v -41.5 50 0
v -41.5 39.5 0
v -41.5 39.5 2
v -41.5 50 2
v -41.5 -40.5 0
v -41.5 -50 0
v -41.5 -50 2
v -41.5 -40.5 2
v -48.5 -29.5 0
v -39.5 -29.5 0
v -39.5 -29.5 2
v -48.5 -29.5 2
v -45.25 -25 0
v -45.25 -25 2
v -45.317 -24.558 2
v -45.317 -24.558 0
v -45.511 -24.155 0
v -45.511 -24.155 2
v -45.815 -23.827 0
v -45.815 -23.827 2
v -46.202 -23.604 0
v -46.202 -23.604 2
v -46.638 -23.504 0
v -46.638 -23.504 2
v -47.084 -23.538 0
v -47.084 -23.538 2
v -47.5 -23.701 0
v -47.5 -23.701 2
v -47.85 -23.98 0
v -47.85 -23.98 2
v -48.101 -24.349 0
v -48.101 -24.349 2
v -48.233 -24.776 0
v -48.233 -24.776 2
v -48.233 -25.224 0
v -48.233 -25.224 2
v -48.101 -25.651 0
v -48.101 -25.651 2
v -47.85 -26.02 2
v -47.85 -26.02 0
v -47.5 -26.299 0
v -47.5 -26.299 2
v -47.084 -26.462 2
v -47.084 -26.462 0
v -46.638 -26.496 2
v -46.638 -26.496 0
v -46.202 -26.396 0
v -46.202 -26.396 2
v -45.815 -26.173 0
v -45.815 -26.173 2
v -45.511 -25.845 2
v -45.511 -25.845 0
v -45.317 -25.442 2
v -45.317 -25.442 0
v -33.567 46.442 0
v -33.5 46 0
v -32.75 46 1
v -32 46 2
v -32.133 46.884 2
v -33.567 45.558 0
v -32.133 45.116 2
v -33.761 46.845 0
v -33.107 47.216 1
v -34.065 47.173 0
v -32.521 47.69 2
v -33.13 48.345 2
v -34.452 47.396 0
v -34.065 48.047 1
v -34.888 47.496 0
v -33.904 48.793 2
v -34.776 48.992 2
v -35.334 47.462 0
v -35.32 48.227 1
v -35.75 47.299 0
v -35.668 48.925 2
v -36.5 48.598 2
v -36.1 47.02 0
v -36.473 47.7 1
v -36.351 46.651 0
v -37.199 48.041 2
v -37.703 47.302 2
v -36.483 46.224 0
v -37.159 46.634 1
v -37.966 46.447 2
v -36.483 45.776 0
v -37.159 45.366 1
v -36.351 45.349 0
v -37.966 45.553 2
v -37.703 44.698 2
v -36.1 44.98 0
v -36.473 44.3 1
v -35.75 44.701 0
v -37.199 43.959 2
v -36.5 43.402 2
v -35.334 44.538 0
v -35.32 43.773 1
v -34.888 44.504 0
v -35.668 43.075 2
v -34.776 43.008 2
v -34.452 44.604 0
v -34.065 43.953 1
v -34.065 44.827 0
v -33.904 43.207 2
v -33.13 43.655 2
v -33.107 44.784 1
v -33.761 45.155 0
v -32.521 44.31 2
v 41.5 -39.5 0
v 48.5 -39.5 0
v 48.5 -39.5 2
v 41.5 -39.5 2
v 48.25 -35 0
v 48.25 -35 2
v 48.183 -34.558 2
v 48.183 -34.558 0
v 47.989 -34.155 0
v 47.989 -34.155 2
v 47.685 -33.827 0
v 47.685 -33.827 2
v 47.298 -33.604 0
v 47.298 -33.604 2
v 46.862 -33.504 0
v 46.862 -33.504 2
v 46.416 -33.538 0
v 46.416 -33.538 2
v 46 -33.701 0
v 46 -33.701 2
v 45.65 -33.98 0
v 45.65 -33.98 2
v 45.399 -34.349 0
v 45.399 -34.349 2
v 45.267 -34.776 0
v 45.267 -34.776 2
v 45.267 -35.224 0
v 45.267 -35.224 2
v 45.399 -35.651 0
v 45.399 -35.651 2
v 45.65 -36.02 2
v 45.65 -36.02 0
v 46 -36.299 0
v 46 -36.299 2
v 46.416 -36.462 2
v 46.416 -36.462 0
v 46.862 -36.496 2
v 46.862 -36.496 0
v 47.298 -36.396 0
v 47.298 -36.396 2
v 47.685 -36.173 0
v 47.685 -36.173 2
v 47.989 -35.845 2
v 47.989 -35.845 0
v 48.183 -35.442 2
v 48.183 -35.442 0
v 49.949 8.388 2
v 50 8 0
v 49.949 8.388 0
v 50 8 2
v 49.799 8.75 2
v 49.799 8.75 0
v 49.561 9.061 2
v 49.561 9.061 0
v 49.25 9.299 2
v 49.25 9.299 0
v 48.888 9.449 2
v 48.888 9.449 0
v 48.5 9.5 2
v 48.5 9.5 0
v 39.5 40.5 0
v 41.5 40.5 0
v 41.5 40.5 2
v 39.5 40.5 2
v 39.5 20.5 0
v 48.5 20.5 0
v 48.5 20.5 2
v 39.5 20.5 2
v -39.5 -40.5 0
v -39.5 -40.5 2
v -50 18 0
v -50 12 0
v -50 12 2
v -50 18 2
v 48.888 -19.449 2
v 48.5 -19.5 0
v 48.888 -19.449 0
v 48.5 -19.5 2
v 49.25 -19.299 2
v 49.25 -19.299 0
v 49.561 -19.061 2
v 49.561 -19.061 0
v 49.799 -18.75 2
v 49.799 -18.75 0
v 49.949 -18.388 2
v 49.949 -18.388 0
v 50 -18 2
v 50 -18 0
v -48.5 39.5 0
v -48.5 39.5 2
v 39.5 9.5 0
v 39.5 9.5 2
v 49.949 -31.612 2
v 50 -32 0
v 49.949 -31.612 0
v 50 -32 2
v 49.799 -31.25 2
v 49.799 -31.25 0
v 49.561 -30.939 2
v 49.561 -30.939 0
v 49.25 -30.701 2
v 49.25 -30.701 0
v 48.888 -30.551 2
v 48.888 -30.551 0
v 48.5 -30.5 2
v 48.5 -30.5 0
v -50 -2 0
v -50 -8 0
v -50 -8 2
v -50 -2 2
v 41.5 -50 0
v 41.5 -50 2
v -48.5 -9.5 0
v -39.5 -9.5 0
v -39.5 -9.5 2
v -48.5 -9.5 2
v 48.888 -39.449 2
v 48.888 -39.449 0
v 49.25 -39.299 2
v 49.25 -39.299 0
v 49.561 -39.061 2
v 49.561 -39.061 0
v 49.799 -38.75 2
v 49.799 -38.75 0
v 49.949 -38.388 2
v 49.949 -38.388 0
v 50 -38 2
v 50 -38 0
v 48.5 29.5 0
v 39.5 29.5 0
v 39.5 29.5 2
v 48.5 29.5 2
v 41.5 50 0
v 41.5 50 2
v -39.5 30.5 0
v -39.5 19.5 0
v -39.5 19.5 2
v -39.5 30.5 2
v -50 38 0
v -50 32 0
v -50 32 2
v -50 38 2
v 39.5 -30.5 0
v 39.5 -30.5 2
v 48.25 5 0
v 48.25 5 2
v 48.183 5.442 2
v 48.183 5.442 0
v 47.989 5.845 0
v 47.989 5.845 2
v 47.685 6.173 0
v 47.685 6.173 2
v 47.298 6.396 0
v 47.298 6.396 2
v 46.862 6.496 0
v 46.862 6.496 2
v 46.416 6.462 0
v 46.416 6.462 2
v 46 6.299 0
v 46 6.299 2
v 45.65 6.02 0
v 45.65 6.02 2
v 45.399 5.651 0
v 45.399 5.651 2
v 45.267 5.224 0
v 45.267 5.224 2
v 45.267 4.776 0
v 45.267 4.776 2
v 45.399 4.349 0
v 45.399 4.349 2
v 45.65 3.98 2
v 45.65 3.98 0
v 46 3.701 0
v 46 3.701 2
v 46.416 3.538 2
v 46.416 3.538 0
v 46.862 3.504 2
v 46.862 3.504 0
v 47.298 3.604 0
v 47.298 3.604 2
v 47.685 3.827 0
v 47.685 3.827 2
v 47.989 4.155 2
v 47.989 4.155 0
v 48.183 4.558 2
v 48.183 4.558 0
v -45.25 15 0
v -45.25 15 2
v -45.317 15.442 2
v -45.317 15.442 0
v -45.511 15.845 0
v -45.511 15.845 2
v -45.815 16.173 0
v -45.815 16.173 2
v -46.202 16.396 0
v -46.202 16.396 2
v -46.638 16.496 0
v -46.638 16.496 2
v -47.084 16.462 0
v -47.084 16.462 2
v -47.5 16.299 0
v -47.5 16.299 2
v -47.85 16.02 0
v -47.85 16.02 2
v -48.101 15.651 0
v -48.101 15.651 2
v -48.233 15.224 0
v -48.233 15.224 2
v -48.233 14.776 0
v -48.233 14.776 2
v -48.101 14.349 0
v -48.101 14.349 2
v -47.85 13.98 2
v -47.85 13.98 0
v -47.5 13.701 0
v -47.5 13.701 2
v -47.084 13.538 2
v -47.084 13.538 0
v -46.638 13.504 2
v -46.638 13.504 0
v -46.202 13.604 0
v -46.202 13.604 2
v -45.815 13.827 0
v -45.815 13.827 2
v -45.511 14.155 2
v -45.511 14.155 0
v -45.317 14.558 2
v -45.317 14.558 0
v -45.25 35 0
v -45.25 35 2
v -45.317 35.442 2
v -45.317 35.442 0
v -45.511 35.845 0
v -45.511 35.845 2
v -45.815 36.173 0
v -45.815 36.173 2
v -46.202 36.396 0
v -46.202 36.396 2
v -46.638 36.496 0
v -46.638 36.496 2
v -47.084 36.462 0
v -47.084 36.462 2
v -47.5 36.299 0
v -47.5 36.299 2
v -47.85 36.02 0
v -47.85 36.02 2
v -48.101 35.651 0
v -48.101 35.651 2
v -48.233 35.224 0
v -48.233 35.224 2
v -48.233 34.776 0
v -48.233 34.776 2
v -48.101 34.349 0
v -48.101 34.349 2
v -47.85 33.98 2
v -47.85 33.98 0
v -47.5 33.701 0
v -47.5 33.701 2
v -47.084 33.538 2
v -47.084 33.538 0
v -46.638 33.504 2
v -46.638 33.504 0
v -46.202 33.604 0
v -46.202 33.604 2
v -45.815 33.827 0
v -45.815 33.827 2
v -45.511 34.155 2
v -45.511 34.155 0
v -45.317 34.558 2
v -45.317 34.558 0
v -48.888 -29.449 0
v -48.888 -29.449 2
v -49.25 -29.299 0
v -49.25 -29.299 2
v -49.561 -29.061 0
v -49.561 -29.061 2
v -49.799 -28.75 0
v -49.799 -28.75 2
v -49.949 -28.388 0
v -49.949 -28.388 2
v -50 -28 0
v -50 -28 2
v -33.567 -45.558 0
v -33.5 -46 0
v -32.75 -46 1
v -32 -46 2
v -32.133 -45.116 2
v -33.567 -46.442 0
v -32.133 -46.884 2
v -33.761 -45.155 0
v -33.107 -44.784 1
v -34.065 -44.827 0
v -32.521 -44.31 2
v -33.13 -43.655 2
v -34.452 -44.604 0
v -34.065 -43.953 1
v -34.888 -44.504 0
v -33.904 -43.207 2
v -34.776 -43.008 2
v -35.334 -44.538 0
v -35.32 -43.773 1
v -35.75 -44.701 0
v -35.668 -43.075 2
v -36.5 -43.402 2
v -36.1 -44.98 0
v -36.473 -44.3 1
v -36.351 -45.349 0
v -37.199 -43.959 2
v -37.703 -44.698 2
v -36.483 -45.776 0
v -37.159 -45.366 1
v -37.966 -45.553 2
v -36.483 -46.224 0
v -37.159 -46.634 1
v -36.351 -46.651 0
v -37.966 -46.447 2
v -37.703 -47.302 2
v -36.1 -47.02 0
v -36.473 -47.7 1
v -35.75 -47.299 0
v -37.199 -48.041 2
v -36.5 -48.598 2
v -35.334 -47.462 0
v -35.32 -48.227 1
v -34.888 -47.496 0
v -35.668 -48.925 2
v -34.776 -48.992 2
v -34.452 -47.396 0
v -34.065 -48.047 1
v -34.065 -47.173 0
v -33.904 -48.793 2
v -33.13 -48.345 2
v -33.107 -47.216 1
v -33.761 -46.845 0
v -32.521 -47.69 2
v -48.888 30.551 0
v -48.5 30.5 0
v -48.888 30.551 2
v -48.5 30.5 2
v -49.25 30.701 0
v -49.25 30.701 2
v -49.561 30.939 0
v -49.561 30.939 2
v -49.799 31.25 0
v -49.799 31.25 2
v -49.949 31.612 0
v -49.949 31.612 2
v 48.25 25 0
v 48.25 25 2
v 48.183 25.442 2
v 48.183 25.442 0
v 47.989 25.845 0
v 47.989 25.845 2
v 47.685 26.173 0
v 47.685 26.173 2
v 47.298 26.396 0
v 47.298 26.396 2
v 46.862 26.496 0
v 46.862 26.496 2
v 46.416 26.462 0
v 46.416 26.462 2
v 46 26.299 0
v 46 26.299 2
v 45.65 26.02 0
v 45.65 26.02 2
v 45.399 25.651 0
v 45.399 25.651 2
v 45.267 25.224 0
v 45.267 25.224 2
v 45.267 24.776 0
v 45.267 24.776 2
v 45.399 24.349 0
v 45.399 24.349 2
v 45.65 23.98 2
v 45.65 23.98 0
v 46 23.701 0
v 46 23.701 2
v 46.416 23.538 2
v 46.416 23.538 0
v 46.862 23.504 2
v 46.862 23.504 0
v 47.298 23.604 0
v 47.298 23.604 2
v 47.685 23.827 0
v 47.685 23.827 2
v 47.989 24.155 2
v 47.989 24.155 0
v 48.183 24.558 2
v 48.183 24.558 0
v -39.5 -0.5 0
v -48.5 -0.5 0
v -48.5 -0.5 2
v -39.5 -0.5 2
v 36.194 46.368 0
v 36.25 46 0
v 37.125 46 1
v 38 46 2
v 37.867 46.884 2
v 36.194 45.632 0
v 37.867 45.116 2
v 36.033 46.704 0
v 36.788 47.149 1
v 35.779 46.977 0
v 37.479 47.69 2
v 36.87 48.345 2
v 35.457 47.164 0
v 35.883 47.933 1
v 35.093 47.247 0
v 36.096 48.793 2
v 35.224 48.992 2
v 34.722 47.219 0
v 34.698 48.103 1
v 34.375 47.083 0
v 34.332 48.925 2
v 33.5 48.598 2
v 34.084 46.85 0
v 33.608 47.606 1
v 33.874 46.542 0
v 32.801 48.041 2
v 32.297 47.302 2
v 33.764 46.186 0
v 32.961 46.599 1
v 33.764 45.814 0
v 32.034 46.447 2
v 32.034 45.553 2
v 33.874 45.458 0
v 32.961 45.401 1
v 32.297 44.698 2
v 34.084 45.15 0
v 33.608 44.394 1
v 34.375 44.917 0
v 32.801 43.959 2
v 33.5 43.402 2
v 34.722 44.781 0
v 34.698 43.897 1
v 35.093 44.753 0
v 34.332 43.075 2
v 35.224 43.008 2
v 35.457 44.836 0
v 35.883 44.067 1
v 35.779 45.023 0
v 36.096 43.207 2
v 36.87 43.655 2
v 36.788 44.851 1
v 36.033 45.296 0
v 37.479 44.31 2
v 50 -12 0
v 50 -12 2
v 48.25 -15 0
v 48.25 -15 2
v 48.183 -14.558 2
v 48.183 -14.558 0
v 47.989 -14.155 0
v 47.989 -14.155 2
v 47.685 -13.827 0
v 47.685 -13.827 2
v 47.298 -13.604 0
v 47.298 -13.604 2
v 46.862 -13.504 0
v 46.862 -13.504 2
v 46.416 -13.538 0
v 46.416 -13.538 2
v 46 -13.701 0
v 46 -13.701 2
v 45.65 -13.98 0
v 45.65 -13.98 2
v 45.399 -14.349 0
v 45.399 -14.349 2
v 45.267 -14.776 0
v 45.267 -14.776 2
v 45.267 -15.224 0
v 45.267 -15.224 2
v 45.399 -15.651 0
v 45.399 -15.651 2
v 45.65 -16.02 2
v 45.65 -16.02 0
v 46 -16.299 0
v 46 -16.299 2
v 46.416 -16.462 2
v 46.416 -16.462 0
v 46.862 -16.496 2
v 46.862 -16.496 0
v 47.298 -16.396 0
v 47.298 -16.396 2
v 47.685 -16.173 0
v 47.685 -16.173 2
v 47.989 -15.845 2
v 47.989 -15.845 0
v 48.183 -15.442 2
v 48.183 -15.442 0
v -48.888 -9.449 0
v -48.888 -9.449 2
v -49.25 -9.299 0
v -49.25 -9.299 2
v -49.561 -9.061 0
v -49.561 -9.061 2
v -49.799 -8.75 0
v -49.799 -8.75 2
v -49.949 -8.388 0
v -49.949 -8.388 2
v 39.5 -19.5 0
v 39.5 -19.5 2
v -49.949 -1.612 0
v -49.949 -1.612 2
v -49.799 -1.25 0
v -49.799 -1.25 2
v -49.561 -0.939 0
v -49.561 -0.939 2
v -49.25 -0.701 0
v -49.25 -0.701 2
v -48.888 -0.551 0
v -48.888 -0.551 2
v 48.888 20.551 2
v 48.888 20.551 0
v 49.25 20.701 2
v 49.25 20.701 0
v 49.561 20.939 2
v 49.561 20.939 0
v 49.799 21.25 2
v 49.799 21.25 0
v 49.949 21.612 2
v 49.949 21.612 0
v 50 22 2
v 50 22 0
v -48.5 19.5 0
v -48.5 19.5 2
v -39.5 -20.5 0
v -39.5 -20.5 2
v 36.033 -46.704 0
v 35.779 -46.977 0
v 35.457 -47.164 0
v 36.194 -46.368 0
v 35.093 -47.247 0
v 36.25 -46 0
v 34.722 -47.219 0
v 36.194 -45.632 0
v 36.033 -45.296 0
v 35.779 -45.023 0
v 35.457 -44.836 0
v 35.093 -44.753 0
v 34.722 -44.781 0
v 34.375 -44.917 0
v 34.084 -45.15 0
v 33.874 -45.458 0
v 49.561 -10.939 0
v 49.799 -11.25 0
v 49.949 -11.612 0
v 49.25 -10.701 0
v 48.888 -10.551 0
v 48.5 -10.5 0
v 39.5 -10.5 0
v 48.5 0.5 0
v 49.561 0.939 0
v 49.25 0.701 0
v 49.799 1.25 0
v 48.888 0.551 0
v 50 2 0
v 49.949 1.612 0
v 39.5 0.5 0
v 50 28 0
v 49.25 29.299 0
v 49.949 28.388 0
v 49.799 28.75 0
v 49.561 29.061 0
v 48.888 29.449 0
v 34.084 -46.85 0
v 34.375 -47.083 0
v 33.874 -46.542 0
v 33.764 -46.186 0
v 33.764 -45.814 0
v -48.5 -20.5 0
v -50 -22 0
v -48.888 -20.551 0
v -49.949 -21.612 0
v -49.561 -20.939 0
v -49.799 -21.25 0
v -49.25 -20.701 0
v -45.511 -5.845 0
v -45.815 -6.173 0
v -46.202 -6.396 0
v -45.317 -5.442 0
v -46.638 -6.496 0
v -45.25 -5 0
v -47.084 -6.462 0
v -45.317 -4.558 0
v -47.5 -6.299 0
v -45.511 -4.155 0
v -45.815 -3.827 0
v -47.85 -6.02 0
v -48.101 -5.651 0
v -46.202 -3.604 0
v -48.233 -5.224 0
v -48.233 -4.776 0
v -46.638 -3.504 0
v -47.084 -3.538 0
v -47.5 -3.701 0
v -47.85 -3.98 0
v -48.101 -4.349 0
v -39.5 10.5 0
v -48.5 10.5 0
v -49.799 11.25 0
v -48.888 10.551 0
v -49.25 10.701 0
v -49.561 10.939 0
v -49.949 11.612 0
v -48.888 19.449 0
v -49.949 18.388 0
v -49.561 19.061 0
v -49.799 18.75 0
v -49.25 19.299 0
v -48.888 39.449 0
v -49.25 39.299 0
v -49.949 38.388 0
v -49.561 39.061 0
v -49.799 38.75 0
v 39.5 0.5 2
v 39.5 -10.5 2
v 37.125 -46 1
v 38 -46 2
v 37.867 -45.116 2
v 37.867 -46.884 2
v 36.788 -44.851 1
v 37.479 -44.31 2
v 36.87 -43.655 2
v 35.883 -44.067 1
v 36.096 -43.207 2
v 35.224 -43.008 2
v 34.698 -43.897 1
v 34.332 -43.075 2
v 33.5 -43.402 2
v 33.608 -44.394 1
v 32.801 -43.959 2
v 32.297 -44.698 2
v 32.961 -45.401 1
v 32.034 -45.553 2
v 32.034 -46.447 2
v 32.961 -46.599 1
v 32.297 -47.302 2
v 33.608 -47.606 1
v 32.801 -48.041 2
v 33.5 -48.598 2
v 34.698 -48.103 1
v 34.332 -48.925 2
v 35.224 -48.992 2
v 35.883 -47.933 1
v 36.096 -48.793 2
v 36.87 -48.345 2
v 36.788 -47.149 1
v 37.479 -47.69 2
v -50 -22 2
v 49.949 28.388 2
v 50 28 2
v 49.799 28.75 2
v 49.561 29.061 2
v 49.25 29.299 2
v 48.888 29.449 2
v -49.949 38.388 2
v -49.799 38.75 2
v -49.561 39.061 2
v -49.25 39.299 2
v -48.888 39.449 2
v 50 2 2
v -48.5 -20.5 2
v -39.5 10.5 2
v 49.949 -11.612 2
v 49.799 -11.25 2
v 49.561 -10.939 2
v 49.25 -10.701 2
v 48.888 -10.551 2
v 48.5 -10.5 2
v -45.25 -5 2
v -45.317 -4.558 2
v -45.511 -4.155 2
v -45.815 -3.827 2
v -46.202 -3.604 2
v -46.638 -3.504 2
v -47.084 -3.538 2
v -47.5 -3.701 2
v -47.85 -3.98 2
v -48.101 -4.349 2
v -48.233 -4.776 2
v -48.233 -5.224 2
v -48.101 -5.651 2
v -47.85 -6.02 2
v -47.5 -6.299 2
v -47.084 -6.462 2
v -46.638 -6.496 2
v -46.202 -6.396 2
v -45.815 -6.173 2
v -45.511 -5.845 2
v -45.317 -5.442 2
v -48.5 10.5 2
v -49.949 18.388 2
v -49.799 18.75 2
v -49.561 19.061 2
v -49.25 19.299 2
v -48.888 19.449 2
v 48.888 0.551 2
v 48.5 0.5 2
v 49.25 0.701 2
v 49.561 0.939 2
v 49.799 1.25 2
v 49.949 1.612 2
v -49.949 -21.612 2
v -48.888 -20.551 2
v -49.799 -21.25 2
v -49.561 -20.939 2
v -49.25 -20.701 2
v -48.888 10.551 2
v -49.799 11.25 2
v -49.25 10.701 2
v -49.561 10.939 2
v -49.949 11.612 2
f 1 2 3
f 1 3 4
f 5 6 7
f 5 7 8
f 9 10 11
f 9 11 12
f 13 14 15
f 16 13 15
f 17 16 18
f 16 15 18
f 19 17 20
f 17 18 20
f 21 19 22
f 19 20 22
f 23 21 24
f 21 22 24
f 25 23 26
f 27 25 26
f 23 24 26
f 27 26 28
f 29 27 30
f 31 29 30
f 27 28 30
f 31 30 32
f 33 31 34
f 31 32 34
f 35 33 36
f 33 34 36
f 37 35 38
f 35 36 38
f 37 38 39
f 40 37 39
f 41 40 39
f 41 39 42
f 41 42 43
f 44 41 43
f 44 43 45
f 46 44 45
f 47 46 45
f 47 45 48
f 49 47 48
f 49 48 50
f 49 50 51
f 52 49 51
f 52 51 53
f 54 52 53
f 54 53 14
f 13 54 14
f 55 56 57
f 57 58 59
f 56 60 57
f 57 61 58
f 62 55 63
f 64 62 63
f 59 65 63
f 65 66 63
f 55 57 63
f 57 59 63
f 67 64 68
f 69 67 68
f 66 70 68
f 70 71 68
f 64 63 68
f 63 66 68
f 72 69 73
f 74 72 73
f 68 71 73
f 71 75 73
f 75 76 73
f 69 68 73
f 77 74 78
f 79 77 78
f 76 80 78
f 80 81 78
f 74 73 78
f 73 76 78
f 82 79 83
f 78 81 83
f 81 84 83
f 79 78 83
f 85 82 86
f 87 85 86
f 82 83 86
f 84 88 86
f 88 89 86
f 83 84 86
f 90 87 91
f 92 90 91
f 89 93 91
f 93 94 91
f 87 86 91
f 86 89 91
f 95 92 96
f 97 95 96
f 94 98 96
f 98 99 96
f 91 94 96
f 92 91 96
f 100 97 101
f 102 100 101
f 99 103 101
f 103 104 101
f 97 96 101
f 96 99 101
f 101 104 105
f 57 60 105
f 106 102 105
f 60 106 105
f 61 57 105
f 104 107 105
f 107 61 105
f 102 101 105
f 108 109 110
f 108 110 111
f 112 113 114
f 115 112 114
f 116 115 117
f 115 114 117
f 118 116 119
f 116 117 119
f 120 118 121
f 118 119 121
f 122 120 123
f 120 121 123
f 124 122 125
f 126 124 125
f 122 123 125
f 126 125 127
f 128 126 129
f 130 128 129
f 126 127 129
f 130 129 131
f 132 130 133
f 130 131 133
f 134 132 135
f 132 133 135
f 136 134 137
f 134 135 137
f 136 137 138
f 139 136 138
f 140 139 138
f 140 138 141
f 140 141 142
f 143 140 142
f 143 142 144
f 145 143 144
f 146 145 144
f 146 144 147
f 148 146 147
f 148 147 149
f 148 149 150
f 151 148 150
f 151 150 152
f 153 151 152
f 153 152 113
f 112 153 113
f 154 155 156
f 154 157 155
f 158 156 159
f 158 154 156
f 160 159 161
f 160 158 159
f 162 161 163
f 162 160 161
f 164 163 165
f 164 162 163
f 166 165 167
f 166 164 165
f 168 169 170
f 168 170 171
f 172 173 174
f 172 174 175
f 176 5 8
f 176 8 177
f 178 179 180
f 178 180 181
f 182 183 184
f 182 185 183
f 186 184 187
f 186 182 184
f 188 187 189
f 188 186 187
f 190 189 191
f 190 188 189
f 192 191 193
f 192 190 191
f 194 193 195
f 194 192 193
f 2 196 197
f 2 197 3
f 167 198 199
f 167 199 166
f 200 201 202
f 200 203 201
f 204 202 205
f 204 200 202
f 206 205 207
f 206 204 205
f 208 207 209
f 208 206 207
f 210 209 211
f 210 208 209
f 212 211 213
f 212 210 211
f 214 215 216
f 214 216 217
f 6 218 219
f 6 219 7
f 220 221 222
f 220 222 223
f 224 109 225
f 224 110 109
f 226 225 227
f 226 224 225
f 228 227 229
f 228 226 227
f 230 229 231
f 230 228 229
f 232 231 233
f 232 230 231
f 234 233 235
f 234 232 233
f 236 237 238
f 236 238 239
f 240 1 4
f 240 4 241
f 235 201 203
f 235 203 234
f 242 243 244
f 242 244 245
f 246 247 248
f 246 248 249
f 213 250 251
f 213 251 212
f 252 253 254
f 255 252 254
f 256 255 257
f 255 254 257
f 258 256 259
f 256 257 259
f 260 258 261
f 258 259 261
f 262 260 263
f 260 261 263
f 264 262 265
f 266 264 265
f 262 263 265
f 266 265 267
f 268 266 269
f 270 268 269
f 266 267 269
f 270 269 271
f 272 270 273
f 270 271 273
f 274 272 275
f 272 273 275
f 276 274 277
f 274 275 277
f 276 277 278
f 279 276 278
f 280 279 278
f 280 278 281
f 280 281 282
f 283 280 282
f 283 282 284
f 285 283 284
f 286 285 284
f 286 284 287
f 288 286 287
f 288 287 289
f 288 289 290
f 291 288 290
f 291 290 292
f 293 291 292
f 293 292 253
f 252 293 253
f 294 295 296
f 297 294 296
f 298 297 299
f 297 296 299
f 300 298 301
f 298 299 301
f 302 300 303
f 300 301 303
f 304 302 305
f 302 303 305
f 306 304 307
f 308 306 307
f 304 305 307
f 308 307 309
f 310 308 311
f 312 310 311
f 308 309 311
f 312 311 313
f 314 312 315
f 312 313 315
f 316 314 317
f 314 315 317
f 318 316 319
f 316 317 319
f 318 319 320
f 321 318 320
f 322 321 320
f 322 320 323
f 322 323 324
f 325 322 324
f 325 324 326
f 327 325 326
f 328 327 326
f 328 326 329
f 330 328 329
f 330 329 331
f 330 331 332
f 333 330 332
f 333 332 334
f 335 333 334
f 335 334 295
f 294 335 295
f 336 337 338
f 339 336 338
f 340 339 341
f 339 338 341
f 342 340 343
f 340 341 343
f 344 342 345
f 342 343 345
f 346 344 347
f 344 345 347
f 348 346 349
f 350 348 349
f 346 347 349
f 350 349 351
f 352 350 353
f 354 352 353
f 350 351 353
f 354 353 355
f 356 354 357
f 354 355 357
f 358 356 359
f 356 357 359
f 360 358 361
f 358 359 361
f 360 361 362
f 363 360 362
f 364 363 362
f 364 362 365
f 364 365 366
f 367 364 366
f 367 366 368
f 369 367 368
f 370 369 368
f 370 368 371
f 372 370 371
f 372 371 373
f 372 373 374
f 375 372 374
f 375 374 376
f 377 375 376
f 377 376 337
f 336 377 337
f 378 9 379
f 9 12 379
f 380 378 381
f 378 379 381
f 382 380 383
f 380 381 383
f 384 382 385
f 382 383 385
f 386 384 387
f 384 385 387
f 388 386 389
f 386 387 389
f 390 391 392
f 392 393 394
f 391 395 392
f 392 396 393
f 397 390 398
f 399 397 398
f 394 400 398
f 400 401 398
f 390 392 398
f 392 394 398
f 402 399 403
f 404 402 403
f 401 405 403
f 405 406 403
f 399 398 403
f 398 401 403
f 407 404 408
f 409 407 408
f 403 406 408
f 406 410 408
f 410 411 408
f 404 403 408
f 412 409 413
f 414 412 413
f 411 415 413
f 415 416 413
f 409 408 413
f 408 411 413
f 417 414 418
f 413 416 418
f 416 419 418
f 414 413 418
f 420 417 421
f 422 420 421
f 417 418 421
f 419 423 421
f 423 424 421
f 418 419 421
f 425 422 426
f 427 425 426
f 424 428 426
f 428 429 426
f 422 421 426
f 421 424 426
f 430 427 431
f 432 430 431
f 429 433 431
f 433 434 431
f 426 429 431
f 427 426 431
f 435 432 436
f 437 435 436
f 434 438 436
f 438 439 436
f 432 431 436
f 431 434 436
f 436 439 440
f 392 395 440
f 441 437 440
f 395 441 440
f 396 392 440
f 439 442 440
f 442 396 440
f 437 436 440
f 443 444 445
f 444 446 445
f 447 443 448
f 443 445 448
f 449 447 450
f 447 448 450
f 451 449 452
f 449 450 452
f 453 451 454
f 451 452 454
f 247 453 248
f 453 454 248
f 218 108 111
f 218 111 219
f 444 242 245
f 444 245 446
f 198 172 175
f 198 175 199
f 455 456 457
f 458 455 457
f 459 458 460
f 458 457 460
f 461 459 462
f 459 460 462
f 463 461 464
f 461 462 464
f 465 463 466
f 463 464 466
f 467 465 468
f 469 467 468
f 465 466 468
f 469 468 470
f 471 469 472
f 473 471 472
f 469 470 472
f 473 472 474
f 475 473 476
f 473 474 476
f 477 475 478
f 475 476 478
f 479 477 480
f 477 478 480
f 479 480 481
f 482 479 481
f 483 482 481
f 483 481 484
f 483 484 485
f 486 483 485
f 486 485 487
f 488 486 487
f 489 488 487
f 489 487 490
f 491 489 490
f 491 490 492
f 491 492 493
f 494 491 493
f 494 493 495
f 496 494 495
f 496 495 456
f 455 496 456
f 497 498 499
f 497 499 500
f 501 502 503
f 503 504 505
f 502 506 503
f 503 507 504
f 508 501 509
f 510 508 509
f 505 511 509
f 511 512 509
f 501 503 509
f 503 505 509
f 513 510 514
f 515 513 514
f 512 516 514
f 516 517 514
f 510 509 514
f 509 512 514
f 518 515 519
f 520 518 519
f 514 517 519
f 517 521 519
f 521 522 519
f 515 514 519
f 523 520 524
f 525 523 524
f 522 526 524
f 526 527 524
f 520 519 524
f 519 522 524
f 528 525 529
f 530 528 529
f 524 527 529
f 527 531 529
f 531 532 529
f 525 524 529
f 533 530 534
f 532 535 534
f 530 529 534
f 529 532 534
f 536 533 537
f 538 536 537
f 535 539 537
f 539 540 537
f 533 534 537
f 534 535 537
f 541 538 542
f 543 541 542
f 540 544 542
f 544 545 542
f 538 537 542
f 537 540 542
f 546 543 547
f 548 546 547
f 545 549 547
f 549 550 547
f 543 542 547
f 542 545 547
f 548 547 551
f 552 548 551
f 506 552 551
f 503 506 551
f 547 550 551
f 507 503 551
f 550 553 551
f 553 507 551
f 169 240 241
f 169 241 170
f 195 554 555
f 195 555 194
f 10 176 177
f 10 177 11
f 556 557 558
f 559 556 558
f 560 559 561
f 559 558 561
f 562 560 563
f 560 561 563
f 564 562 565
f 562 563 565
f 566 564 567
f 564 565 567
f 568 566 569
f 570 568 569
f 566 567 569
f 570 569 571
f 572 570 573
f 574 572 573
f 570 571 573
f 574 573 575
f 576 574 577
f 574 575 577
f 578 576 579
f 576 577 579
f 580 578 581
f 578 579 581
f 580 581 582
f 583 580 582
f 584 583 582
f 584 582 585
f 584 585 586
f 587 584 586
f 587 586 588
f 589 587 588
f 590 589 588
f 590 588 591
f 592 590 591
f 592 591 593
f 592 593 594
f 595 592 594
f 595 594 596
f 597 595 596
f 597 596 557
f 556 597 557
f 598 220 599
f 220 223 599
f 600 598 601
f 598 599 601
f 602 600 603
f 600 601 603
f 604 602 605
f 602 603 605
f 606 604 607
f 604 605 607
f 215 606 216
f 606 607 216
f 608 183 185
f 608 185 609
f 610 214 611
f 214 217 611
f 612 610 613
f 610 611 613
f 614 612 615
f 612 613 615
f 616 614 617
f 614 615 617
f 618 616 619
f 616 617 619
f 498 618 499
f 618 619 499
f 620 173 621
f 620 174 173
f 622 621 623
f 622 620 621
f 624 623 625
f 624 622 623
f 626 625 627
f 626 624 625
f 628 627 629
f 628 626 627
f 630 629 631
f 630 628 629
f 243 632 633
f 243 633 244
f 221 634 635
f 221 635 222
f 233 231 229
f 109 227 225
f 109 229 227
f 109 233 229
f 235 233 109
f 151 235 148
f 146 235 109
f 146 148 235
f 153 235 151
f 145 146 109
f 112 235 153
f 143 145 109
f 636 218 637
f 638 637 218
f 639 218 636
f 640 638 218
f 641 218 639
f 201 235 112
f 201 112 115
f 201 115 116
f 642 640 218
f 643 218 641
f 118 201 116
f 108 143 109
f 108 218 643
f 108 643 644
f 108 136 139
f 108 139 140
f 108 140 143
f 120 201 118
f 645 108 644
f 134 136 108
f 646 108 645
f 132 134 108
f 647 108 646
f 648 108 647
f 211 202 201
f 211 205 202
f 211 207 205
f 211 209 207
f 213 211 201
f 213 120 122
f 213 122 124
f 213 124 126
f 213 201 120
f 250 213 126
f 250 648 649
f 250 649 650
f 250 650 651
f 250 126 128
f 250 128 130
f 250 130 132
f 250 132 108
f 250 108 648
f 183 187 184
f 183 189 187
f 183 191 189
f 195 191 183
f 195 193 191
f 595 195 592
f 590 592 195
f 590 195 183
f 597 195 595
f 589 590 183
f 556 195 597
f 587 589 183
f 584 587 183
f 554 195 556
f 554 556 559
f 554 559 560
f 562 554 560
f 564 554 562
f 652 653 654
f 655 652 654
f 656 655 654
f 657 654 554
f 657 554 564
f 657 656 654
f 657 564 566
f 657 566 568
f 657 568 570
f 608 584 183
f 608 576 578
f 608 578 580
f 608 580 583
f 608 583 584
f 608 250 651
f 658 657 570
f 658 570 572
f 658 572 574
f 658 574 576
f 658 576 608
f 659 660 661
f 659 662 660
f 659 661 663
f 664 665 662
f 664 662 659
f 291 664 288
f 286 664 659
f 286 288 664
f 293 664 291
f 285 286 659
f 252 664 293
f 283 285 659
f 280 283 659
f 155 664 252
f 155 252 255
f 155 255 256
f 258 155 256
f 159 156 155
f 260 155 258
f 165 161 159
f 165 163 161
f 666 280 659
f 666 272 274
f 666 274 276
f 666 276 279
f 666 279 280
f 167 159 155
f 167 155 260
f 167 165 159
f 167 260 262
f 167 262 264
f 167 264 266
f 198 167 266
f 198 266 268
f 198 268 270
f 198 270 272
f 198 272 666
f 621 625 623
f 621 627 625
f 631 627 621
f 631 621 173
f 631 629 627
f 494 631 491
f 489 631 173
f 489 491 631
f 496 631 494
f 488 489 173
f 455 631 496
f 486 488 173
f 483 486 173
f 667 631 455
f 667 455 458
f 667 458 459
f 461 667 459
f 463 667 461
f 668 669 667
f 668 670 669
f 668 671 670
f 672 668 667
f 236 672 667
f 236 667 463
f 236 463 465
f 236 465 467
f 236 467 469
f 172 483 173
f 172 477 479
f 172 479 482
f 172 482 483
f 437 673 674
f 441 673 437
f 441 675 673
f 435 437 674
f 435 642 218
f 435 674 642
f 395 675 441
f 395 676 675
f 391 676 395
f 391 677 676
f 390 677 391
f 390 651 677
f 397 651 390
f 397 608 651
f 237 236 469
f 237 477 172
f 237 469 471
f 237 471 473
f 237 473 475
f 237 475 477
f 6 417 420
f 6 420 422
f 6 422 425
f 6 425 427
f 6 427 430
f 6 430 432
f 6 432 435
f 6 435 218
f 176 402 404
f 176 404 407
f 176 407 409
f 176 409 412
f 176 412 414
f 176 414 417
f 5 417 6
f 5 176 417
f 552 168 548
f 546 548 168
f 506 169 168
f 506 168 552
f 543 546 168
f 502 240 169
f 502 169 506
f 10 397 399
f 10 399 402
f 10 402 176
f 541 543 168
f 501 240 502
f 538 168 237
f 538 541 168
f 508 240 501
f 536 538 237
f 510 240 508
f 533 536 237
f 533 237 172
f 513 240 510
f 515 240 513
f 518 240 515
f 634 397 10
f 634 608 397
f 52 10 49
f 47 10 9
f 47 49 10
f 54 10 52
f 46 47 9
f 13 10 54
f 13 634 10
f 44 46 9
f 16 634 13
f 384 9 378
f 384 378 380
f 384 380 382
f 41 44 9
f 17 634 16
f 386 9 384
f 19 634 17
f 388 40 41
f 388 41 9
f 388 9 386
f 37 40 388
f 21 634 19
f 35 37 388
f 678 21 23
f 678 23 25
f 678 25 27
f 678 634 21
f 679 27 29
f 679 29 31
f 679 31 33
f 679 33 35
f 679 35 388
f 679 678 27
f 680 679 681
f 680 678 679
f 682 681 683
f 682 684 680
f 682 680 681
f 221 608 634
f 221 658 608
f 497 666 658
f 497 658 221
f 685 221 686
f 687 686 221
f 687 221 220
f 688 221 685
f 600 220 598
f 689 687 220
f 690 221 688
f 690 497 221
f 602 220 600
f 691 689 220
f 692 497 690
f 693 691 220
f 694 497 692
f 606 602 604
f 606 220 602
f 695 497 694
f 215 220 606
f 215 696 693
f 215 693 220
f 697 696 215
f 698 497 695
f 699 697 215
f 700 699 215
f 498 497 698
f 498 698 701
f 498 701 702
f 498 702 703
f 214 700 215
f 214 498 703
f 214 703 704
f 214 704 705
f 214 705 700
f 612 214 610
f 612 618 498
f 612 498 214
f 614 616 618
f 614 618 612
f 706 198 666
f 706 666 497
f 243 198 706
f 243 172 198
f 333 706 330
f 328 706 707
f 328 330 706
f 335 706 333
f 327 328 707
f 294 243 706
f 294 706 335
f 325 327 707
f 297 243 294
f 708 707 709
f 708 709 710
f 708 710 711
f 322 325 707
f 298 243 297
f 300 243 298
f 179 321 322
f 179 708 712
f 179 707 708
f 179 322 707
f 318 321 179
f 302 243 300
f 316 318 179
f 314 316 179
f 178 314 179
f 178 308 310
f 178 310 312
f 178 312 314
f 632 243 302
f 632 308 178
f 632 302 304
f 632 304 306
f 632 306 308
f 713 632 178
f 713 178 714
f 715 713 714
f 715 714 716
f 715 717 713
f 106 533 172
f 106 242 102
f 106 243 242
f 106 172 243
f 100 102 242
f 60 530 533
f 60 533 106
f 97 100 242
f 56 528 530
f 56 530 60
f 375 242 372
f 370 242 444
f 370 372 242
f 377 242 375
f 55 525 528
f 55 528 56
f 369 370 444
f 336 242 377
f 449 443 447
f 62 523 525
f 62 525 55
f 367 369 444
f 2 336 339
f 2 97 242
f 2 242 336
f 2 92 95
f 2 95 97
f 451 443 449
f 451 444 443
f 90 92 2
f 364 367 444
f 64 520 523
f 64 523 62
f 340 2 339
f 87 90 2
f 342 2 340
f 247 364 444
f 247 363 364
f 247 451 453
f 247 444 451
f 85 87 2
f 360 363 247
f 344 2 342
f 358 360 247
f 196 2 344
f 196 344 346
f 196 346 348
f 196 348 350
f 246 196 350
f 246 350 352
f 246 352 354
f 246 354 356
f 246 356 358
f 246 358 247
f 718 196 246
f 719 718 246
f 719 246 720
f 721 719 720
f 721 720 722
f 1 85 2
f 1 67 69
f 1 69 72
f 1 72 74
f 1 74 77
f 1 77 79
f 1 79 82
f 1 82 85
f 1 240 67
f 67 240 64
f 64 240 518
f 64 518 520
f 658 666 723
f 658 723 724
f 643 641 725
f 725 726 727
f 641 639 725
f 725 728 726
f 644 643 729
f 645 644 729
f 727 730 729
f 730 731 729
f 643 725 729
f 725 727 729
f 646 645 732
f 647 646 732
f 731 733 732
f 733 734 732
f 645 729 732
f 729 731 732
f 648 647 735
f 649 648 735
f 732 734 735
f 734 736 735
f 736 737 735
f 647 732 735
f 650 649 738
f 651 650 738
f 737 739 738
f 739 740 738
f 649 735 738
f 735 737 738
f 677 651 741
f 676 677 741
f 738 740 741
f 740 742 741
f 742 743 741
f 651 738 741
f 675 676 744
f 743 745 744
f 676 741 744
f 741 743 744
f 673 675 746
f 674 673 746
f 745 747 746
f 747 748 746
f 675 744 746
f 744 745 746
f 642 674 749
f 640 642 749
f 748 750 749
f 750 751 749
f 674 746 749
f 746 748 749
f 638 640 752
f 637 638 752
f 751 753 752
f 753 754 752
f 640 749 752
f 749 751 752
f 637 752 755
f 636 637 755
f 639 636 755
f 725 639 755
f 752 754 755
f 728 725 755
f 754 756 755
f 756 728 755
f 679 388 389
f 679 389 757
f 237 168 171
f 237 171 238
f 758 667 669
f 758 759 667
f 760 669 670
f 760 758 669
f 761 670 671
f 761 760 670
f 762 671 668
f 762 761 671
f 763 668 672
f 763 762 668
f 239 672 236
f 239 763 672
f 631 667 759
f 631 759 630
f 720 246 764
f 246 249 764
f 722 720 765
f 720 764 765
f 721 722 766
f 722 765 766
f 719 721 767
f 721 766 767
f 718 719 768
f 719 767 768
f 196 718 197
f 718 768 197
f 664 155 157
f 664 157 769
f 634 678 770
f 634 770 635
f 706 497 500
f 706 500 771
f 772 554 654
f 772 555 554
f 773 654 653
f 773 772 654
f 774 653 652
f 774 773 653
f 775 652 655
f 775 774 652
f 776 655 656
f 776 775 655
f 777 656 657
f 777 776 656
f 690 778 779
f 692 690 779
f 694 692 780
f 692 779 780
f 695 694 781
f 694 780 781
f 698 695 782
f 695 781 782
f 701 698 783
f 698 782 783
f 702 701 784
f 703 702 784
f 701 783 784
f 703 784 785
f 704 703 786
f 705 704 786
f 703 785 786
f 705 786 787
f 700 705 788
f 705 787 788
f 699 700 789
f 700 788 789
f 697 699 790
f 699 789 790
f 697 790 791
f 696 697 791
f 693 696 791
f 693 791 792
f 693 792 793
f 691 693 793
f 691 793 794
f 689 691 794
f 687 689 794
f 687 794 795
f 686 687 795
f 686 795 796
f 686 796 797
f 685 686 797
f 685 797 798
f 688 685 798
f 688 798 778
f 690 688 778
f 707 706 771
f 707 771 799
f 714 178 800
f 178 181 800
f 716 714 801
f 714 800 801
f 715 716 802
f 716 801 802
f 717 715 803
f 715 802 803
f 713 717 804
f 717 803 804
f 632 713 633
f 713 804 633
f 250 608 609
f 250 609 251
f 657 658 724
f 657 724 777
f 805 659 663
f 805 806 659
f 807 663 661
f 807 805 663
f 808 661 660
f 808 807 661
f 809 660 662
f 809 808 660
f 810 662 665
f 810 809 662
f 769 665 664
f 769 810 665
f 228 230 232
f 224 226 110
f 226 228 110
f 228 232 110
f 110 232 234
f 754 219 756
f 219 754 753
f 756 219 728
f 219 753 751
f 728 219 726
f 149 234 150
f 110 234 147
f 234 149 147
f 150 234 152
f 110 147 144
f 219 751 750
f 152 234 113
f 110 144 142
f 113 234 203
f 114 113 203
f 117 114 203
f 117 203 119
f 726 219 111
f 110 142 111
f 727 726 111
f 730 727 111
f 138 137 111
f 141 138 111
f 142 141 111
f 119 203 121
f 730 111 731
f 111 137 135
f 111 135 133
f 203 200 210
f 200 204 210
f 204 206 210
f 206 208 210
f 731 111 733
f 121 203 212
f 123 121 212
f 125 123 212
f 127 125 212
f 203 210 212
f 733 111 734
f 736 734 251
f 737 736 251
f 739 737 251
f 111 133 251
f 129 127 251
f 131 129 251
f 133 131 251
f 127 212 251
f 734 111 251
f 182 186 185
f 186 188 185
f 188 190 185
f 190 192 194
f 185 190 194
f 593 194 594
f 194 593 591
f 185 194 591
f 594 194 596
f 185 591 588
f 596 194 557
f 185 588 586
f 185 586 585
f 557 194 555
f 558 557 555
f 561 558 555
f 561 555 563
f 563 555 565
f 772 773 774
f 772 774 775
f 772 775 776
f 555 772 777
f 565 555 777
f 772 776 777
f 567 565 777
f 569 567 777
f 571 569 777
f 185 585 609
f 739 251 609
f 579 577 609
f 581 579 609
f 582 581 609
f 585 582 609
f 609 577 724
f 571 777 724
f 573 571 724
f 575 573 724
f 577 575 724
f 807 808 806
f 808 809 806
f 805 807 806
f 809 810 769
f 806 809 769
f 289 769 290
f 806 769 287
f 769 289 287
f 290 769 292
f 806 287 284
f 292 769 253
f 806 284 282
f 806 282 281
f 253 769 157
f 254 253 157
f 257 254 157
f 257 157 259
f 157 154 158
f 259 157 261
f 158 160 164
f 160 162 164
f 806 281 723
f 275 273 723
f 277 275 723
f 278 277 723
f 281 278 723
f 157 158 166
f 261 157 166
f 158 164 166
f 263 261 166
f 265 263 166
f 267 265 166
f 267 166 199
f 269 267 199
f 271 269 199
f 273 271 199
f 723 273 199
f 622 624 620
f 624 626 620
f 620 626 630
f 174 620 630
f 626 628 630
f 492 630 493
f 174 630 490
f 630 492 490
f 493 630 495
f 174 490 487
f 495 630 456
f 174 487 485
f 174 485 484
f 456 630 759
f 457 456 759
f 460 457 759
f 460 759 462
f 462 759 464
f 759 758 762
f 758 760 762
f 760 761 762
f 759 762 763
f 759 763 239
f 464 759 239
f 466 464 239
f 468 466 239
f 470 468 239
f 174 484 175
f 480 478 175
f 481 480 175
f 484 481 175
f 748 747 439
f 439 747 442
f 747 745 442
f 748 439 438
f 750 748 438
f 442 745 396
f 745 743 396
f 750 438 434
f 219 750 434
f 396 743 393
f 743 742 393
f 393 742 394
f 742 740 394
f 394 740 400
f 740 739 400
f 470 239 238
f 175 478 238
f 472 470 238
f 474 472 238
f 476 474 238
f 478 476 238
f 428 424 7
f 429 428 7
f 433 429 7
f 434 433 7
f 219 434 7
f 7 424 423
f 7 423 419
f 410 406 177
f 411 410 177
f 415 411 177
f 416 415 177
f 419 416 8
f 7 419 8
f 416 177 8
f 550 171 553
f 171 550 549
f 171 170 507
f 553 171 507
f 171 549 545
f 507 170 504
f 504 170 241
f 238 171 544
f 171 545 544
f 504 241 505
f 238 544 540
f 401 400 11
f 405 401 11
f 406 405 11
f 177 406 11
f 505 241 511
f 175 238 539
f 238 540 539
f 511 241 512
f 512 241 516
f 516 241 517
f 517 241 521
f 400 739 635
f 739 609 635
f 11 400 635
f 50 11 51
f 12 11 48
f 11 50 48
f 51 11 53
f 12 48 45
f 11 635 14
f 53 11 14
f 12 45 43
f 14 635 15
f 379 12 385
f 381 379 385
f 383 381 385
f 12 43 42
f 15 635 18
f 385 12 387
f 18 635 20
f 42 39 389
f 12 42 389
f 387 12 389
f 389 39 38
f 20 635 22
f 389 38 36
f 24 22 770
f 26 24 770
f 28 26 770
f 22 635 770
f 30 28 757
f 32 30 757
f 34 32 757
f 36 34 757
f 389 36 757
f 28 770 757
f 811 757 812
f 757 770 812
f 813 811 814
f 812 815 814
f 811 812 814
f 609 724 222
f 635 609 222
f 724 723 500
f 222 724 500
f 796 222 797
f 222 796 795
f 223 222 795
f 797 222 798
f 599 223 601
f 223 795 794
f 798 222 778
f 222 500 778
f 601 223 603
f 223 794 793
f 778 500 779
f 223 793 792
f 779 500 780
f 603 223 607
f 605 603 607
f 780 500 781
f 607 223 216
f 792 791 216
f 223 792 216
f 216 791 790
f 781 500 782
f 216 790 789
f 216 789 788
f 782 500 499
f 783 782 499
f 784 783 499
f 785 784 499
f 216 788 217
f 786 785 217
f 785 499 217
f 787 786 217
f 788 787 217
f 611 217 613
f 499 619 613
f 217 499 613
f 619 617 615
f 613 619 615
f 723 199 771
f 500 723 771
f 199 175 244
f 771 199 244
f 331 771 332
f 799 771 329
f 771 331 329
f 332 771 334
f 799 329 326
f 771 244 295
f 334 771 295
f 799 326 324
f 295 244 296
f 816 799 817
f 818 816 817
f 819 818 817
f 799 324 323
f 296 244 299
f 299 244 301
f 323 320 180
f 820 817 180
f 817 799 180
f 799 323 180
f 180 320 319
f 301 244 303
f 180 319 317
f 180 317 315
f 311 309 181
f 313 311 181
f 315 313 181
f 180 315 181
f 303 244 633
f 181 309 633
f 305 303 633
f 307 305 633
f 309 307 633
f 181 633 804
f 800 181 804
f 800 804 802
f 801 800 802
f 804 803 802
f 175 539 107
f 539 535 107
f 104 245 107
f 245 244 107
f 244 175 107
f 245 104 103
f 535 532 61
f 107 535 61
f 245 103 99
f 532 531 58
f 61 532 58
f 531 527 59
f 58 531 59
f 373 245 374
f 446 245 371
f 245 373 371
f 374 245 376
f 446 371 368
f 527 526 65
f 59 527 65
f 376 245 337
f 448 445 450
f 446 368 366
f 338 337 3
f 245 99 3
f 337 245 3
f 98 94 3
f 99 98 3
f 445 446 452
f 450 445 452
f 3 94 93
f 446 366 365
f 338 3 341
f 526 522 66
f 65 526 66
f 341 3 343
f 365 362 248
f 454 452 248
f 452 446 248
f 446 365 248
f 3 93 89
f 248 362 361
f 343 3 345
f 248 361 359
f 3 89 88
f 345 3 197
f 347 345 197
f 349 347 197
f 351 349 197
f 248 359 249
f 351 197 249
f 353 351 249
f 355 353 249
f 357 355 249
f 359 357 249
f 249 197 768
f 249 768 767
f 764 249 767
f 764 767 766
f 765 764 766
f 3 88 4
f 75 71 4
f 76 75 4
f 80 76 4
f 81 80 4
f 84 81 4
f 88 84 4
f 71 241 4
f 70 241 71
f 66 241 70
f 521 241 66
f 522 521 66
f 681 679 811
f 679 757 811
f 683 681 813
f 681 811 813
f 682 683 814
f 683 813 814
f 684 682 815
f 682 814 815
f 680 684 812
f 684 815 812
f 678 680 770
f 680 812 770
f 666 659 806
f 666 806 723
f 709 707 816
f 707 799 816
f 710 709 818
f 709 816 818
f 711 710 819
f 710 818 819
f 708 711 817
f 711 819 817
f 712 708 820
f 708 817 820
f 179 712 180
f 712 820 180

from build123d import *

# Parameters (mm, degrees)
SKETCH008_R         = 1.25
SKETCH009_R         = 3
SKETCH006_R         = 1.25
SKETCH007_R         = 3
SKETCH004_R         = 1.5
SKETCH005_R         = 3
SKETCH002_R         = 1.5
SKETCH003_R         = 3
PAD_DEPTH           = 2
SKETCH001_R         = 1.5
POCKET_DEPTH        = 2.001
LINEARPATTERN_COUNT = 4
LINEARPATTERN_PITCH = 20
FILLET_R            = 1.5


with BuildPart() as loft003:
    # Sketch008 → Loft003 section 0
    with BuildSketch(Plane.XY):
        with Locations((35, -46)):
            Circle(SKETCH008_R)
    # Sketch009 → Loft003 section 1
    with BuildSketch(Plane.XY.offset(2)):
        with Locations((35, -46)):
            Circle(SKETCH009_R)
    loft(ruled=True)


with BuildPart() as loft002:
    # Sketch006 → Loft002 section 0
    with BuildSketch(Plane.XY):
        with Locations((35, 46)):
            Circle(SKETCH006_R)
    # Sketch007 → Loft002 section 1
    with BuildSketch(Plane.XY.offset(2)):
        with Locations((35, 46)):
            Circle(SKETCH007_R)
    loft(ruled=True)


with BuildPart() as loft001:
    # Sketch004 → Loft001 section 0
    with BuildSketch(Plane.XY):
        with Locations((-35, -46)):
            Circle(SKETCH004_R)
    # Sketch005 → Loft001 section 1
    with BuildSketch(Plane.XY.offset(2)):
        with Locations((-35, -46)):
            Circle(SKETCH005_R)
    loft(ruled=True)


with BuildPart() as loft_body:
    # Sketch002 → Loft section 0
    with BuildSketch(Plane.XY):
        with Locations((-35, 46)):
            Circle(SKETCH002_R)
    # Sketch003 → Loft section 1
    with BuildSketch(Plane.XY.offset(2)):
        with Locations((-35, 46)):
            Circle(SKETCH003_R)
    loft(ruled=True)


with BuildPart() as cut003:
    # Sketch → Pad (new body)
    with BuildSketch(Plane.XY):
        Polygon((-41.5, -50), (-41.5, -40.5), (-39.5, -40.5), (-39.5, -29.5), (-50, -29.5), (-50, -20.5), (-39.5, -20.5), (-39.5, -9.5), (-50, -9.5), (-50, -0.5), (-39.5, -0.5), (-39.5, 10.5), (-50, 10.5), (-50, 19.5), (-39.5, 19.5), (-39.5, 30.5), (-50, 30.5), (-50, 39.5), (-41.5, 39.5), (-41.5, 50), (41.5, 50), (41.5, 40.5), (39.5, 40.5), (39.5, 29.5), (50, 29.5), (50, 20.5), (39.5, 20.5), (39.5, 9.5), (50, 9.5), (50, 0.5), (39.5, 0.5), (39.5, -10.5), (50, -10.5), (50, -19.5), (39.5, -19.5), (39.5, -30.5), (50, -30.5), (50, -39.5), (41.5, -39.5), (41.5, -50), align=None)
    extrude(amount=PAD_DEPTH)

    # Sketch001 → Pocket (cut, through all)
    with BuildSketch(Plane.XY.offset(2)):
        with Locations((-46.75, -25)):
            Circle(SKETCH001_R)
        with Locations((46.75, -35)):
            Circle(SKETCH001_R)
    pocket = extrude(amount=-POCKET_DEPTH, mode=Mode.SUBTRACT)

    # LinearPattern: Pocket ×4
    with Locations(*[(0, i * LINEARPATTERN_PITCH, 0) for i in range(1, LINEARPATTERN_COUNT)]):
        add(pocket, mode=Mode.SUBTRACT)

    # Fillet
    fillet_edges = [cut003.edges().sort_by_distance(p)[0] for p in [
        (50, -39.5, 1),
        (-50, -29.5, 1),
        (50, -30.5, 1),
        (-50, -20.5, 1),
        (50, -19.5, 1),
        (-50, -9.5, 1),
        (50, -10.5, 1),
        (-50, -0.5, 1),
        (50, 0.5, 1),
        (-50, 10.5, 1),
        (50, 9.5, 1),
        (-50, 19.5, 1),
        (50, 20.5, 1),
        (-50, 30.5, 1),
        (50, 29.5, 1),
        (-50, 39.5, 1),
    ]]
    fillet(fillet_edges, radius=FILLET_R)

    # Cut: cut Loft body
    add(loft_body.part, mode=Mode.SUBTRACT)

    # Cut001: cut Loft001
    add(loft001.part, mode=Mode.SUBTRACT)

    # Cut002: cut Loft002
    add(loft002.part, mode=Mode.SUBTRACT)

    # Cut003: cut Loft003
    add(loft003.part, mode=Mode.SUBTRACT)


solid = cut003.part
